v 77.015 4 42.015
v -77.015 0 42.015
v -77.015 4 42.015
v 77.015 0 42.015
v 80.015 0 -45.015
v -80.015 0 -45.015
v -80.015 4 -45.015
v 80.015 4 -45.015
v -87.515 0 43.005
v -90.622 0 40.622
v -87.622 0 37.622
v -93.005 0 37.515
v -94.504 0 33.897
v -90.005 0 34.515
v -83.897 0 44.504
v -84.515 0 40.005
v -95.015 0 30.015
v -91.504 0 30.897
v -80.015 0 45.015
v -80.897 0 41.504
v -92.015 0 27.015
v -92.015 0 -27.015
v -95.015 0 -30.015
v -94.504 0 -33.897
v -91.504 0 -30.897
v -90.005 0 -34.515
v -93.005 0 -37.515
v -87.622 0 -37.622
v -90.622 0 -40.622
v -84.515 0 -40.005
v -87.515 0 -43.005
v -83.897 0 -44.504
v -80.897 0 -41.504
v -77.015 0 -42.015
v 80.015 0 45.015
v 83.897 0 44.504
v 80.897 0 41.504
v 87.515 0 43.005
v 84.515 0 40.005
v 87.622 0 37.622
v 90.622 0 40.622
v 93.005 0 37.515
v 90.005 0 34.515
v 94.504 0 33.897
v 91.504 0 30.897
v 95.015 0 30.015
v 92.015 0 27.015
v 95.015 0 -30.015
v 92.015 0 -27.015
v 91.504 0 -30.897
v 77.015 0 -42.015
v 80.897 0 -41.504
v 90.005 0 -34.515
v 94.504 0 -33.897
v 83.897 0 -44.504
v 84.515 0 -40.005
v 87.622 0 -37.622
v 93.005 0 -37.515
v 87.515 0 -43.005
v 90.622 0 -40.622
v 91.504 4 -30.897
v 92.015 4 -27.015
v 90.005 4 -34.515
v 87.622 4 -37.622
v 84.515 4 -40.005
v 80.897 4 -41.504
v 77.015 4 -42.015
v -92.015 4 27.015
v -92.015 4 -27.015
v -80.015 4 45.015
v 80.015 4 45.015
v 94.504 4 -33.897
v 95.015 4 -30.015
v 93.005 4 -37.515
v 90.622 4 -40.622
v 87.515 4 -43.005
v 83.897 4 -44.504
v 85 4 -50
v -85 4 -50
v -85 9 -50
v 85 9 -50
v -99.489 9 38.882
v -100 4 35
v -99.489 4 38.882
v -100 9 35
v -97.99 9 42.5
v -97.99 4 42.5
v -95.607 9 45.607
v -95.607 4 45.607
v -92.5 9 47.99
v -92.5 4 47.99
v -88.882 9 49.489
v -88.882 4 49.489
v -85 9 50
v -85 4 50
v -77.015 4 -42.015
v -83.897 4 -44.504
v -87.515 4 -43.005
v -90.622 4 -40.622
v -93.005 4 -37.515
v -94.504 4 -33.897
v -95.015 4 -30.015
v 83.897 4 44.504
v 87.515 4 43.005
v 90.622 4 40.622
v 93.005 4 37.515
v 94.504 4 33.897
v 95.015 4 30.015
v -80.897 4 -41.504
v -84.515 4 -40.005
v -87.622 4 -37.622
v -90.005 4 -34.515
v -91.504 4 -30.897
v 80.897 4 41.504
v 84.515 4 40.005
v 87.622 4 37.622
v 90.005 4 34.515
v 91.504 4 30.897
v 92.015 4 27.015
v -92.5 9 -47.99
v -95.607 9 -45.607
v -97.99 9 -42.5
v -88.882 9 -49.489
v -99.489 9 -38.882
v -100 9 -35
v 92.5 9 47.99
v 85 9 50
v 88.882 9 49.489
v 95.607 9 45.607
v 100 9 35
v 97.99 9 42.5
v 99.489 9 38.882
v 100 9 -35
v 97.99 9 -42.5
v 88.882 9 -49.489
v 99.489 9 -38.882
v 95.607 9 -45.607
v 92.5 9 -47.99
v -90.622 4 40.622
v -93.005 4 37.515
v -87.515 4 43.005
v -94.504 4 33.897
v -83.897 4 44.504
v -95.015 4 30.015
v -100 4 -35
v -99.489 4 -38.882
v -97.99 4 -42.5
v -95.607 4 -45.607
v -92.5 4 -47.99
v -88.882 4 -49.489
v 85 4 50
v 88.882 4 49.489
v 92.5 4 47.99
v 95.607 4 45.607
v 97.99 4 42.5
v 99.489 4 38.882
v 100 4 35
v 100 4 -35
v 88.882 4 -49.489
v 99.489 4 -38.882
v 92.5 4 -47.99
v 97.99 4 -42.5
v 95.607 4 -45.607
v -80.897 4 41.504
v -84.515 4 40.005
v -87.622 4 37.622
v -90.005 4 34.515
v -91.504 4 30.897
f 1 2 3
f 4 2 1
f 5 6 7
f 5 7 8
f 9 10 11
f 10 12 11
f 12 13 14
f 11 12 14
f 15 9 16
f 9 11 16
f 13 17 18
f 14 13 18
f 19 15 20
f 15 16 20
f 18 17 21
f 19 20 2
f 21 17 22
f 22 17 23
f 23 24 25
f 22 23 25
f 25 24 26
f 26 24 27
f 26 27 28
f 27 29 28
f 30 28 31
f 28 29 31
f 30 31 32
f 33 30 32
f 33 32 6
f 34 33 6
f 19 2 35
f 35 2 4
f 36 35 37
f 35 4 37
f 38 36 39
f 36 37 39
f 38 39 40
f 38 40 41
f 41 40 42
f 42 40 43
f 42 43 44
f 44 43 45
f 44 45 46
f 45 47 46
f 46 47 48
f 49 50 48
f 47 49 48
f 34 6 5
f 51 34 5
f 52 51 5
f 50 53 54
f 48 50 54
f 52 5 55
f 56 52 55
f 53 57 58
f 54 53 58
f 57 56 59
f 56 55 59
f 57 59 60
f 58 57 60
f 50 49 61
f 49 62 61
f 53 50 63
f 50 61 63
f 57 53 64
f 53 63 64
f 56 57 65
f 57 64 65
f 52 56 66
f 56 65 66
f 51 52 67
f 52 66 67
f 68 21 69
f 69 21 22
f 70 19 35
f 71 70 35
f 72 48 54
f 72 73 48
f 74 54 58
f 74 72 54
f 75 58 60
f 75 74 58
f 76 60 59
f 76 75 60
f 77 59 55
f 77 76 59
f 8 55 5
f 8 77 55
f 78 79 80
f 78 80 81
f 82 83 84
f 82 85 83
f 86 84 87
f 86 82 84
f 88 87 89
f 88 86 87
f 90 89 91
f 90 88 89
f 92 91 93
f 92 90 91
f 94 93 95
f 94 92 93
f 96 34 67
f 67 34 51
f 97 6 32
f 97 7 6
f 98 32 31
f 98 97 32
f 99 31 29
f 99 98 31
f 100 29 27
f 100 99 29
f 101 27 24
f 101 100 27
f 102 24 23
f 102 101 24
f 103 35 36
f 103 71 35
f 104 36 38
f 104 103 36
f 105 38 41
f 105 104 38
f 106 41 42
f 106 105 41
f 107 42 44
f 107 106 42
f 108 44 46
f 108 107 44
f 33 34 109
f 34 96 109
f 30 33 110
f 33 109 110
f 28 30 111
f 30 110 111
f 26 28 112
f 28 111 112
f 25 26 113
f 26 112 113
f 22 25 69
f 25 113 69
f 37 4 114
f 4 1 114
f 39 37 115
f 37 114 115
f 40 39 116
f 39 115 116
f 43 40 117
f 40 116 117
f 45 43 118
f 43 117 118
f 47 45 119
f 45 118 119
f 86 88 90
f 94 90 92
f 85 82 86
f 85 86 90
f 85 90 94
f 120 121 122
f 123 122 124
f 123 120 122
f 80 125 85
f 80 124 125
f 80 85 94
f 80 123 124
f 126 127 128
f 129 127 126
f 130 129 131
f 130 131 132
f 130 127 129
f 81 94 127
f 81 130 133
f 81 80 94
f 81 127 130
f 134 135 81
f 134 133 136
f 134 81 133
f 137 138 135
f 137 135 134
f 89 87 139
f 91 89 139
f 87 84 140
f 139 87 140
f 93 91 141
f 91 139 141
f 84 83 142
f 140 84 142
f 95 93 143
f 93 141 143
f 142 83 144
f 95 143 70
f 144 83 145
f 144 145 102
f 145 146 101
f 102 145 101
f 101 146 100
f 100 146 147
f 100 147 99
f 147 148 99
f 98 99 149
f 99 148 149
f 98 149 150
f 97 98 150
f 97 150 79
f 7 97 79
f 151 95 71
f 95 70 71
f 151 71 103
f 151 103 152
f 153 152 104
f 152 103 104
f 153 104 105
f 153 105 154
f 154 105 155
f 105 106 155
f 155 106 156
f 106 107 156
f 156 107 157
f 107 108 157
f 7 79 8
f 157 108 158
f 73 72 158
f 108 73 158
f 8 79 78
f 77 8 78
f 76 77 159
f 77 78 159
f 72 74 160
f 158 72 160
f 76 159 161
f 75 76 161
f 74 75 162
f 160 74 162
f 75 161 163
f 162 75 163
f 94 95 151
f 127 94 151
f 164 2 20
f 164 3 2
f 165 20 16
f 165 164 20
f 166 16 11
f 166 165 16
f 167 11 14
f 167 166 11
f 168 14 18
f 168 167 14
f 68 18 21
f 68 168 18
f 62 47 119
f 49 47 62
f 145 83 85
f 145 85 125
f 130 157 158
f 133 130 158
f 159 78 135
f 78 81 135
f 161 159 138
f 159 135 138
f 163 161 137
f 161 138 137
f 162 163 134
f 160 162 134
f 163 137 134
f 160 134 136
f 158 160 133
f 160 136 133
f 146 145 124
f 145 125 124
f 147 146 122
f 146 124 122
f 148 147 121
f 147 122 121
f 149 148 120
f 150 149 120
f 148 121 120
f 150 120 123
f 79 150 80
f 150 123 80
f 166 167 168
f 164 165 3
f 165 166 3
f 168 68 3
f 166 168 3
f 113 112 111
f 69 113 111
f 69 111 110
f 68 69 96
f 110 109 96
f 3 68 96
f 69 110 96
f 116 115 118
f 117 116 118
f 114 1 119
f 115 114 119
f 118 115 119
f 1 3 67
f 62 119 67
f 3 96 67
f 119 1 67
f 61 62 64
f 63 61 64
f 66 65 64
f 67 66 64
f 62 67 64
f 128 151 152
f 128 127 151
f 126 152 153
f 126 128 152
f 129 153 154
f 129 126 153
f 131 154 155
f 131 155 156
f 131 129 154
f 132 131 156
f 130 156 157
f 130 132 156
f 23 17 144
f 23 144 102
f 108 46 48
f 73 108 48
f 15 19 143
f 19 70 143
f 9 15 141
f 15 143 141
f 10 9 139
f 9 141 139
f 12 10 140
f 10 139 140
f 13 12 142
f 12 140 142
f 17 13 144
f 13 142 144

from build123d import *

# Parameters (mm, degrees)
SKETCH1_W           = 190.03
SKETCH1_H           = 90.03
SKETCH1_W_2         = 184.03
SKETCH1_H_2         = 84.03
BOSS_EXTRUDE1_DEPTH = 4
SKETCH2_W           = 200
SKETCH2_H           = 100
BOSS_EXTRUDE2_DEPTH = 5
FILLET1_R           = 15


with BuildPart() as part:
    # Sketch1 → Boss-Extrude1 (new body)
    with BuildSketch(Plane(origin=(0, 0, 0), x_dir=(1, 0, 0), z_dir=(0, 1, 0))):
        Rectangle(SKETCH1_W, SKETCH1_H)
        Rectangle(SKETCH1_W_2, SKETCH1_H_2, mode=Mode.SUBTRACT)
    extrude(amount=BOSS_EXTRUDE1_DEPTH)

    # Sketch2 → Boss-Extrude2 (add)
    with BuildSketch(Plane(origin=(0, 4, 0), x_dir=(1, 0, 0), z_dir=(0, 1, 0))):
        Rectangle(SKETCH2_W, SKETCH2_H)
    extrude(amount=BOSS_EXTRUDE2_DEPTH)

    # Fillet1
    fillet1_edges = [part.edges().sort_by_distance(p)[0] for p in [
        (92.015, 2, 42.015),
        (92.015, 2, -42.015),
        (-92.015, 2, -42.015),
        (-92.015, 2, 42.015),
        (100, 6.5, 50),
        (100, 6.5, -50),
        (-100, 6.5, -50),
        (-100, 6.5, 50),
        (95.015, 2, 45.015),
        (-95.015, 2, 45.015),
        (-95.015, 2, -45.015),
        (95.015, 2, -45.015),
    ]]
    fillet(fillet1_edges, radius=FILLET1_R)


solid = part.part
